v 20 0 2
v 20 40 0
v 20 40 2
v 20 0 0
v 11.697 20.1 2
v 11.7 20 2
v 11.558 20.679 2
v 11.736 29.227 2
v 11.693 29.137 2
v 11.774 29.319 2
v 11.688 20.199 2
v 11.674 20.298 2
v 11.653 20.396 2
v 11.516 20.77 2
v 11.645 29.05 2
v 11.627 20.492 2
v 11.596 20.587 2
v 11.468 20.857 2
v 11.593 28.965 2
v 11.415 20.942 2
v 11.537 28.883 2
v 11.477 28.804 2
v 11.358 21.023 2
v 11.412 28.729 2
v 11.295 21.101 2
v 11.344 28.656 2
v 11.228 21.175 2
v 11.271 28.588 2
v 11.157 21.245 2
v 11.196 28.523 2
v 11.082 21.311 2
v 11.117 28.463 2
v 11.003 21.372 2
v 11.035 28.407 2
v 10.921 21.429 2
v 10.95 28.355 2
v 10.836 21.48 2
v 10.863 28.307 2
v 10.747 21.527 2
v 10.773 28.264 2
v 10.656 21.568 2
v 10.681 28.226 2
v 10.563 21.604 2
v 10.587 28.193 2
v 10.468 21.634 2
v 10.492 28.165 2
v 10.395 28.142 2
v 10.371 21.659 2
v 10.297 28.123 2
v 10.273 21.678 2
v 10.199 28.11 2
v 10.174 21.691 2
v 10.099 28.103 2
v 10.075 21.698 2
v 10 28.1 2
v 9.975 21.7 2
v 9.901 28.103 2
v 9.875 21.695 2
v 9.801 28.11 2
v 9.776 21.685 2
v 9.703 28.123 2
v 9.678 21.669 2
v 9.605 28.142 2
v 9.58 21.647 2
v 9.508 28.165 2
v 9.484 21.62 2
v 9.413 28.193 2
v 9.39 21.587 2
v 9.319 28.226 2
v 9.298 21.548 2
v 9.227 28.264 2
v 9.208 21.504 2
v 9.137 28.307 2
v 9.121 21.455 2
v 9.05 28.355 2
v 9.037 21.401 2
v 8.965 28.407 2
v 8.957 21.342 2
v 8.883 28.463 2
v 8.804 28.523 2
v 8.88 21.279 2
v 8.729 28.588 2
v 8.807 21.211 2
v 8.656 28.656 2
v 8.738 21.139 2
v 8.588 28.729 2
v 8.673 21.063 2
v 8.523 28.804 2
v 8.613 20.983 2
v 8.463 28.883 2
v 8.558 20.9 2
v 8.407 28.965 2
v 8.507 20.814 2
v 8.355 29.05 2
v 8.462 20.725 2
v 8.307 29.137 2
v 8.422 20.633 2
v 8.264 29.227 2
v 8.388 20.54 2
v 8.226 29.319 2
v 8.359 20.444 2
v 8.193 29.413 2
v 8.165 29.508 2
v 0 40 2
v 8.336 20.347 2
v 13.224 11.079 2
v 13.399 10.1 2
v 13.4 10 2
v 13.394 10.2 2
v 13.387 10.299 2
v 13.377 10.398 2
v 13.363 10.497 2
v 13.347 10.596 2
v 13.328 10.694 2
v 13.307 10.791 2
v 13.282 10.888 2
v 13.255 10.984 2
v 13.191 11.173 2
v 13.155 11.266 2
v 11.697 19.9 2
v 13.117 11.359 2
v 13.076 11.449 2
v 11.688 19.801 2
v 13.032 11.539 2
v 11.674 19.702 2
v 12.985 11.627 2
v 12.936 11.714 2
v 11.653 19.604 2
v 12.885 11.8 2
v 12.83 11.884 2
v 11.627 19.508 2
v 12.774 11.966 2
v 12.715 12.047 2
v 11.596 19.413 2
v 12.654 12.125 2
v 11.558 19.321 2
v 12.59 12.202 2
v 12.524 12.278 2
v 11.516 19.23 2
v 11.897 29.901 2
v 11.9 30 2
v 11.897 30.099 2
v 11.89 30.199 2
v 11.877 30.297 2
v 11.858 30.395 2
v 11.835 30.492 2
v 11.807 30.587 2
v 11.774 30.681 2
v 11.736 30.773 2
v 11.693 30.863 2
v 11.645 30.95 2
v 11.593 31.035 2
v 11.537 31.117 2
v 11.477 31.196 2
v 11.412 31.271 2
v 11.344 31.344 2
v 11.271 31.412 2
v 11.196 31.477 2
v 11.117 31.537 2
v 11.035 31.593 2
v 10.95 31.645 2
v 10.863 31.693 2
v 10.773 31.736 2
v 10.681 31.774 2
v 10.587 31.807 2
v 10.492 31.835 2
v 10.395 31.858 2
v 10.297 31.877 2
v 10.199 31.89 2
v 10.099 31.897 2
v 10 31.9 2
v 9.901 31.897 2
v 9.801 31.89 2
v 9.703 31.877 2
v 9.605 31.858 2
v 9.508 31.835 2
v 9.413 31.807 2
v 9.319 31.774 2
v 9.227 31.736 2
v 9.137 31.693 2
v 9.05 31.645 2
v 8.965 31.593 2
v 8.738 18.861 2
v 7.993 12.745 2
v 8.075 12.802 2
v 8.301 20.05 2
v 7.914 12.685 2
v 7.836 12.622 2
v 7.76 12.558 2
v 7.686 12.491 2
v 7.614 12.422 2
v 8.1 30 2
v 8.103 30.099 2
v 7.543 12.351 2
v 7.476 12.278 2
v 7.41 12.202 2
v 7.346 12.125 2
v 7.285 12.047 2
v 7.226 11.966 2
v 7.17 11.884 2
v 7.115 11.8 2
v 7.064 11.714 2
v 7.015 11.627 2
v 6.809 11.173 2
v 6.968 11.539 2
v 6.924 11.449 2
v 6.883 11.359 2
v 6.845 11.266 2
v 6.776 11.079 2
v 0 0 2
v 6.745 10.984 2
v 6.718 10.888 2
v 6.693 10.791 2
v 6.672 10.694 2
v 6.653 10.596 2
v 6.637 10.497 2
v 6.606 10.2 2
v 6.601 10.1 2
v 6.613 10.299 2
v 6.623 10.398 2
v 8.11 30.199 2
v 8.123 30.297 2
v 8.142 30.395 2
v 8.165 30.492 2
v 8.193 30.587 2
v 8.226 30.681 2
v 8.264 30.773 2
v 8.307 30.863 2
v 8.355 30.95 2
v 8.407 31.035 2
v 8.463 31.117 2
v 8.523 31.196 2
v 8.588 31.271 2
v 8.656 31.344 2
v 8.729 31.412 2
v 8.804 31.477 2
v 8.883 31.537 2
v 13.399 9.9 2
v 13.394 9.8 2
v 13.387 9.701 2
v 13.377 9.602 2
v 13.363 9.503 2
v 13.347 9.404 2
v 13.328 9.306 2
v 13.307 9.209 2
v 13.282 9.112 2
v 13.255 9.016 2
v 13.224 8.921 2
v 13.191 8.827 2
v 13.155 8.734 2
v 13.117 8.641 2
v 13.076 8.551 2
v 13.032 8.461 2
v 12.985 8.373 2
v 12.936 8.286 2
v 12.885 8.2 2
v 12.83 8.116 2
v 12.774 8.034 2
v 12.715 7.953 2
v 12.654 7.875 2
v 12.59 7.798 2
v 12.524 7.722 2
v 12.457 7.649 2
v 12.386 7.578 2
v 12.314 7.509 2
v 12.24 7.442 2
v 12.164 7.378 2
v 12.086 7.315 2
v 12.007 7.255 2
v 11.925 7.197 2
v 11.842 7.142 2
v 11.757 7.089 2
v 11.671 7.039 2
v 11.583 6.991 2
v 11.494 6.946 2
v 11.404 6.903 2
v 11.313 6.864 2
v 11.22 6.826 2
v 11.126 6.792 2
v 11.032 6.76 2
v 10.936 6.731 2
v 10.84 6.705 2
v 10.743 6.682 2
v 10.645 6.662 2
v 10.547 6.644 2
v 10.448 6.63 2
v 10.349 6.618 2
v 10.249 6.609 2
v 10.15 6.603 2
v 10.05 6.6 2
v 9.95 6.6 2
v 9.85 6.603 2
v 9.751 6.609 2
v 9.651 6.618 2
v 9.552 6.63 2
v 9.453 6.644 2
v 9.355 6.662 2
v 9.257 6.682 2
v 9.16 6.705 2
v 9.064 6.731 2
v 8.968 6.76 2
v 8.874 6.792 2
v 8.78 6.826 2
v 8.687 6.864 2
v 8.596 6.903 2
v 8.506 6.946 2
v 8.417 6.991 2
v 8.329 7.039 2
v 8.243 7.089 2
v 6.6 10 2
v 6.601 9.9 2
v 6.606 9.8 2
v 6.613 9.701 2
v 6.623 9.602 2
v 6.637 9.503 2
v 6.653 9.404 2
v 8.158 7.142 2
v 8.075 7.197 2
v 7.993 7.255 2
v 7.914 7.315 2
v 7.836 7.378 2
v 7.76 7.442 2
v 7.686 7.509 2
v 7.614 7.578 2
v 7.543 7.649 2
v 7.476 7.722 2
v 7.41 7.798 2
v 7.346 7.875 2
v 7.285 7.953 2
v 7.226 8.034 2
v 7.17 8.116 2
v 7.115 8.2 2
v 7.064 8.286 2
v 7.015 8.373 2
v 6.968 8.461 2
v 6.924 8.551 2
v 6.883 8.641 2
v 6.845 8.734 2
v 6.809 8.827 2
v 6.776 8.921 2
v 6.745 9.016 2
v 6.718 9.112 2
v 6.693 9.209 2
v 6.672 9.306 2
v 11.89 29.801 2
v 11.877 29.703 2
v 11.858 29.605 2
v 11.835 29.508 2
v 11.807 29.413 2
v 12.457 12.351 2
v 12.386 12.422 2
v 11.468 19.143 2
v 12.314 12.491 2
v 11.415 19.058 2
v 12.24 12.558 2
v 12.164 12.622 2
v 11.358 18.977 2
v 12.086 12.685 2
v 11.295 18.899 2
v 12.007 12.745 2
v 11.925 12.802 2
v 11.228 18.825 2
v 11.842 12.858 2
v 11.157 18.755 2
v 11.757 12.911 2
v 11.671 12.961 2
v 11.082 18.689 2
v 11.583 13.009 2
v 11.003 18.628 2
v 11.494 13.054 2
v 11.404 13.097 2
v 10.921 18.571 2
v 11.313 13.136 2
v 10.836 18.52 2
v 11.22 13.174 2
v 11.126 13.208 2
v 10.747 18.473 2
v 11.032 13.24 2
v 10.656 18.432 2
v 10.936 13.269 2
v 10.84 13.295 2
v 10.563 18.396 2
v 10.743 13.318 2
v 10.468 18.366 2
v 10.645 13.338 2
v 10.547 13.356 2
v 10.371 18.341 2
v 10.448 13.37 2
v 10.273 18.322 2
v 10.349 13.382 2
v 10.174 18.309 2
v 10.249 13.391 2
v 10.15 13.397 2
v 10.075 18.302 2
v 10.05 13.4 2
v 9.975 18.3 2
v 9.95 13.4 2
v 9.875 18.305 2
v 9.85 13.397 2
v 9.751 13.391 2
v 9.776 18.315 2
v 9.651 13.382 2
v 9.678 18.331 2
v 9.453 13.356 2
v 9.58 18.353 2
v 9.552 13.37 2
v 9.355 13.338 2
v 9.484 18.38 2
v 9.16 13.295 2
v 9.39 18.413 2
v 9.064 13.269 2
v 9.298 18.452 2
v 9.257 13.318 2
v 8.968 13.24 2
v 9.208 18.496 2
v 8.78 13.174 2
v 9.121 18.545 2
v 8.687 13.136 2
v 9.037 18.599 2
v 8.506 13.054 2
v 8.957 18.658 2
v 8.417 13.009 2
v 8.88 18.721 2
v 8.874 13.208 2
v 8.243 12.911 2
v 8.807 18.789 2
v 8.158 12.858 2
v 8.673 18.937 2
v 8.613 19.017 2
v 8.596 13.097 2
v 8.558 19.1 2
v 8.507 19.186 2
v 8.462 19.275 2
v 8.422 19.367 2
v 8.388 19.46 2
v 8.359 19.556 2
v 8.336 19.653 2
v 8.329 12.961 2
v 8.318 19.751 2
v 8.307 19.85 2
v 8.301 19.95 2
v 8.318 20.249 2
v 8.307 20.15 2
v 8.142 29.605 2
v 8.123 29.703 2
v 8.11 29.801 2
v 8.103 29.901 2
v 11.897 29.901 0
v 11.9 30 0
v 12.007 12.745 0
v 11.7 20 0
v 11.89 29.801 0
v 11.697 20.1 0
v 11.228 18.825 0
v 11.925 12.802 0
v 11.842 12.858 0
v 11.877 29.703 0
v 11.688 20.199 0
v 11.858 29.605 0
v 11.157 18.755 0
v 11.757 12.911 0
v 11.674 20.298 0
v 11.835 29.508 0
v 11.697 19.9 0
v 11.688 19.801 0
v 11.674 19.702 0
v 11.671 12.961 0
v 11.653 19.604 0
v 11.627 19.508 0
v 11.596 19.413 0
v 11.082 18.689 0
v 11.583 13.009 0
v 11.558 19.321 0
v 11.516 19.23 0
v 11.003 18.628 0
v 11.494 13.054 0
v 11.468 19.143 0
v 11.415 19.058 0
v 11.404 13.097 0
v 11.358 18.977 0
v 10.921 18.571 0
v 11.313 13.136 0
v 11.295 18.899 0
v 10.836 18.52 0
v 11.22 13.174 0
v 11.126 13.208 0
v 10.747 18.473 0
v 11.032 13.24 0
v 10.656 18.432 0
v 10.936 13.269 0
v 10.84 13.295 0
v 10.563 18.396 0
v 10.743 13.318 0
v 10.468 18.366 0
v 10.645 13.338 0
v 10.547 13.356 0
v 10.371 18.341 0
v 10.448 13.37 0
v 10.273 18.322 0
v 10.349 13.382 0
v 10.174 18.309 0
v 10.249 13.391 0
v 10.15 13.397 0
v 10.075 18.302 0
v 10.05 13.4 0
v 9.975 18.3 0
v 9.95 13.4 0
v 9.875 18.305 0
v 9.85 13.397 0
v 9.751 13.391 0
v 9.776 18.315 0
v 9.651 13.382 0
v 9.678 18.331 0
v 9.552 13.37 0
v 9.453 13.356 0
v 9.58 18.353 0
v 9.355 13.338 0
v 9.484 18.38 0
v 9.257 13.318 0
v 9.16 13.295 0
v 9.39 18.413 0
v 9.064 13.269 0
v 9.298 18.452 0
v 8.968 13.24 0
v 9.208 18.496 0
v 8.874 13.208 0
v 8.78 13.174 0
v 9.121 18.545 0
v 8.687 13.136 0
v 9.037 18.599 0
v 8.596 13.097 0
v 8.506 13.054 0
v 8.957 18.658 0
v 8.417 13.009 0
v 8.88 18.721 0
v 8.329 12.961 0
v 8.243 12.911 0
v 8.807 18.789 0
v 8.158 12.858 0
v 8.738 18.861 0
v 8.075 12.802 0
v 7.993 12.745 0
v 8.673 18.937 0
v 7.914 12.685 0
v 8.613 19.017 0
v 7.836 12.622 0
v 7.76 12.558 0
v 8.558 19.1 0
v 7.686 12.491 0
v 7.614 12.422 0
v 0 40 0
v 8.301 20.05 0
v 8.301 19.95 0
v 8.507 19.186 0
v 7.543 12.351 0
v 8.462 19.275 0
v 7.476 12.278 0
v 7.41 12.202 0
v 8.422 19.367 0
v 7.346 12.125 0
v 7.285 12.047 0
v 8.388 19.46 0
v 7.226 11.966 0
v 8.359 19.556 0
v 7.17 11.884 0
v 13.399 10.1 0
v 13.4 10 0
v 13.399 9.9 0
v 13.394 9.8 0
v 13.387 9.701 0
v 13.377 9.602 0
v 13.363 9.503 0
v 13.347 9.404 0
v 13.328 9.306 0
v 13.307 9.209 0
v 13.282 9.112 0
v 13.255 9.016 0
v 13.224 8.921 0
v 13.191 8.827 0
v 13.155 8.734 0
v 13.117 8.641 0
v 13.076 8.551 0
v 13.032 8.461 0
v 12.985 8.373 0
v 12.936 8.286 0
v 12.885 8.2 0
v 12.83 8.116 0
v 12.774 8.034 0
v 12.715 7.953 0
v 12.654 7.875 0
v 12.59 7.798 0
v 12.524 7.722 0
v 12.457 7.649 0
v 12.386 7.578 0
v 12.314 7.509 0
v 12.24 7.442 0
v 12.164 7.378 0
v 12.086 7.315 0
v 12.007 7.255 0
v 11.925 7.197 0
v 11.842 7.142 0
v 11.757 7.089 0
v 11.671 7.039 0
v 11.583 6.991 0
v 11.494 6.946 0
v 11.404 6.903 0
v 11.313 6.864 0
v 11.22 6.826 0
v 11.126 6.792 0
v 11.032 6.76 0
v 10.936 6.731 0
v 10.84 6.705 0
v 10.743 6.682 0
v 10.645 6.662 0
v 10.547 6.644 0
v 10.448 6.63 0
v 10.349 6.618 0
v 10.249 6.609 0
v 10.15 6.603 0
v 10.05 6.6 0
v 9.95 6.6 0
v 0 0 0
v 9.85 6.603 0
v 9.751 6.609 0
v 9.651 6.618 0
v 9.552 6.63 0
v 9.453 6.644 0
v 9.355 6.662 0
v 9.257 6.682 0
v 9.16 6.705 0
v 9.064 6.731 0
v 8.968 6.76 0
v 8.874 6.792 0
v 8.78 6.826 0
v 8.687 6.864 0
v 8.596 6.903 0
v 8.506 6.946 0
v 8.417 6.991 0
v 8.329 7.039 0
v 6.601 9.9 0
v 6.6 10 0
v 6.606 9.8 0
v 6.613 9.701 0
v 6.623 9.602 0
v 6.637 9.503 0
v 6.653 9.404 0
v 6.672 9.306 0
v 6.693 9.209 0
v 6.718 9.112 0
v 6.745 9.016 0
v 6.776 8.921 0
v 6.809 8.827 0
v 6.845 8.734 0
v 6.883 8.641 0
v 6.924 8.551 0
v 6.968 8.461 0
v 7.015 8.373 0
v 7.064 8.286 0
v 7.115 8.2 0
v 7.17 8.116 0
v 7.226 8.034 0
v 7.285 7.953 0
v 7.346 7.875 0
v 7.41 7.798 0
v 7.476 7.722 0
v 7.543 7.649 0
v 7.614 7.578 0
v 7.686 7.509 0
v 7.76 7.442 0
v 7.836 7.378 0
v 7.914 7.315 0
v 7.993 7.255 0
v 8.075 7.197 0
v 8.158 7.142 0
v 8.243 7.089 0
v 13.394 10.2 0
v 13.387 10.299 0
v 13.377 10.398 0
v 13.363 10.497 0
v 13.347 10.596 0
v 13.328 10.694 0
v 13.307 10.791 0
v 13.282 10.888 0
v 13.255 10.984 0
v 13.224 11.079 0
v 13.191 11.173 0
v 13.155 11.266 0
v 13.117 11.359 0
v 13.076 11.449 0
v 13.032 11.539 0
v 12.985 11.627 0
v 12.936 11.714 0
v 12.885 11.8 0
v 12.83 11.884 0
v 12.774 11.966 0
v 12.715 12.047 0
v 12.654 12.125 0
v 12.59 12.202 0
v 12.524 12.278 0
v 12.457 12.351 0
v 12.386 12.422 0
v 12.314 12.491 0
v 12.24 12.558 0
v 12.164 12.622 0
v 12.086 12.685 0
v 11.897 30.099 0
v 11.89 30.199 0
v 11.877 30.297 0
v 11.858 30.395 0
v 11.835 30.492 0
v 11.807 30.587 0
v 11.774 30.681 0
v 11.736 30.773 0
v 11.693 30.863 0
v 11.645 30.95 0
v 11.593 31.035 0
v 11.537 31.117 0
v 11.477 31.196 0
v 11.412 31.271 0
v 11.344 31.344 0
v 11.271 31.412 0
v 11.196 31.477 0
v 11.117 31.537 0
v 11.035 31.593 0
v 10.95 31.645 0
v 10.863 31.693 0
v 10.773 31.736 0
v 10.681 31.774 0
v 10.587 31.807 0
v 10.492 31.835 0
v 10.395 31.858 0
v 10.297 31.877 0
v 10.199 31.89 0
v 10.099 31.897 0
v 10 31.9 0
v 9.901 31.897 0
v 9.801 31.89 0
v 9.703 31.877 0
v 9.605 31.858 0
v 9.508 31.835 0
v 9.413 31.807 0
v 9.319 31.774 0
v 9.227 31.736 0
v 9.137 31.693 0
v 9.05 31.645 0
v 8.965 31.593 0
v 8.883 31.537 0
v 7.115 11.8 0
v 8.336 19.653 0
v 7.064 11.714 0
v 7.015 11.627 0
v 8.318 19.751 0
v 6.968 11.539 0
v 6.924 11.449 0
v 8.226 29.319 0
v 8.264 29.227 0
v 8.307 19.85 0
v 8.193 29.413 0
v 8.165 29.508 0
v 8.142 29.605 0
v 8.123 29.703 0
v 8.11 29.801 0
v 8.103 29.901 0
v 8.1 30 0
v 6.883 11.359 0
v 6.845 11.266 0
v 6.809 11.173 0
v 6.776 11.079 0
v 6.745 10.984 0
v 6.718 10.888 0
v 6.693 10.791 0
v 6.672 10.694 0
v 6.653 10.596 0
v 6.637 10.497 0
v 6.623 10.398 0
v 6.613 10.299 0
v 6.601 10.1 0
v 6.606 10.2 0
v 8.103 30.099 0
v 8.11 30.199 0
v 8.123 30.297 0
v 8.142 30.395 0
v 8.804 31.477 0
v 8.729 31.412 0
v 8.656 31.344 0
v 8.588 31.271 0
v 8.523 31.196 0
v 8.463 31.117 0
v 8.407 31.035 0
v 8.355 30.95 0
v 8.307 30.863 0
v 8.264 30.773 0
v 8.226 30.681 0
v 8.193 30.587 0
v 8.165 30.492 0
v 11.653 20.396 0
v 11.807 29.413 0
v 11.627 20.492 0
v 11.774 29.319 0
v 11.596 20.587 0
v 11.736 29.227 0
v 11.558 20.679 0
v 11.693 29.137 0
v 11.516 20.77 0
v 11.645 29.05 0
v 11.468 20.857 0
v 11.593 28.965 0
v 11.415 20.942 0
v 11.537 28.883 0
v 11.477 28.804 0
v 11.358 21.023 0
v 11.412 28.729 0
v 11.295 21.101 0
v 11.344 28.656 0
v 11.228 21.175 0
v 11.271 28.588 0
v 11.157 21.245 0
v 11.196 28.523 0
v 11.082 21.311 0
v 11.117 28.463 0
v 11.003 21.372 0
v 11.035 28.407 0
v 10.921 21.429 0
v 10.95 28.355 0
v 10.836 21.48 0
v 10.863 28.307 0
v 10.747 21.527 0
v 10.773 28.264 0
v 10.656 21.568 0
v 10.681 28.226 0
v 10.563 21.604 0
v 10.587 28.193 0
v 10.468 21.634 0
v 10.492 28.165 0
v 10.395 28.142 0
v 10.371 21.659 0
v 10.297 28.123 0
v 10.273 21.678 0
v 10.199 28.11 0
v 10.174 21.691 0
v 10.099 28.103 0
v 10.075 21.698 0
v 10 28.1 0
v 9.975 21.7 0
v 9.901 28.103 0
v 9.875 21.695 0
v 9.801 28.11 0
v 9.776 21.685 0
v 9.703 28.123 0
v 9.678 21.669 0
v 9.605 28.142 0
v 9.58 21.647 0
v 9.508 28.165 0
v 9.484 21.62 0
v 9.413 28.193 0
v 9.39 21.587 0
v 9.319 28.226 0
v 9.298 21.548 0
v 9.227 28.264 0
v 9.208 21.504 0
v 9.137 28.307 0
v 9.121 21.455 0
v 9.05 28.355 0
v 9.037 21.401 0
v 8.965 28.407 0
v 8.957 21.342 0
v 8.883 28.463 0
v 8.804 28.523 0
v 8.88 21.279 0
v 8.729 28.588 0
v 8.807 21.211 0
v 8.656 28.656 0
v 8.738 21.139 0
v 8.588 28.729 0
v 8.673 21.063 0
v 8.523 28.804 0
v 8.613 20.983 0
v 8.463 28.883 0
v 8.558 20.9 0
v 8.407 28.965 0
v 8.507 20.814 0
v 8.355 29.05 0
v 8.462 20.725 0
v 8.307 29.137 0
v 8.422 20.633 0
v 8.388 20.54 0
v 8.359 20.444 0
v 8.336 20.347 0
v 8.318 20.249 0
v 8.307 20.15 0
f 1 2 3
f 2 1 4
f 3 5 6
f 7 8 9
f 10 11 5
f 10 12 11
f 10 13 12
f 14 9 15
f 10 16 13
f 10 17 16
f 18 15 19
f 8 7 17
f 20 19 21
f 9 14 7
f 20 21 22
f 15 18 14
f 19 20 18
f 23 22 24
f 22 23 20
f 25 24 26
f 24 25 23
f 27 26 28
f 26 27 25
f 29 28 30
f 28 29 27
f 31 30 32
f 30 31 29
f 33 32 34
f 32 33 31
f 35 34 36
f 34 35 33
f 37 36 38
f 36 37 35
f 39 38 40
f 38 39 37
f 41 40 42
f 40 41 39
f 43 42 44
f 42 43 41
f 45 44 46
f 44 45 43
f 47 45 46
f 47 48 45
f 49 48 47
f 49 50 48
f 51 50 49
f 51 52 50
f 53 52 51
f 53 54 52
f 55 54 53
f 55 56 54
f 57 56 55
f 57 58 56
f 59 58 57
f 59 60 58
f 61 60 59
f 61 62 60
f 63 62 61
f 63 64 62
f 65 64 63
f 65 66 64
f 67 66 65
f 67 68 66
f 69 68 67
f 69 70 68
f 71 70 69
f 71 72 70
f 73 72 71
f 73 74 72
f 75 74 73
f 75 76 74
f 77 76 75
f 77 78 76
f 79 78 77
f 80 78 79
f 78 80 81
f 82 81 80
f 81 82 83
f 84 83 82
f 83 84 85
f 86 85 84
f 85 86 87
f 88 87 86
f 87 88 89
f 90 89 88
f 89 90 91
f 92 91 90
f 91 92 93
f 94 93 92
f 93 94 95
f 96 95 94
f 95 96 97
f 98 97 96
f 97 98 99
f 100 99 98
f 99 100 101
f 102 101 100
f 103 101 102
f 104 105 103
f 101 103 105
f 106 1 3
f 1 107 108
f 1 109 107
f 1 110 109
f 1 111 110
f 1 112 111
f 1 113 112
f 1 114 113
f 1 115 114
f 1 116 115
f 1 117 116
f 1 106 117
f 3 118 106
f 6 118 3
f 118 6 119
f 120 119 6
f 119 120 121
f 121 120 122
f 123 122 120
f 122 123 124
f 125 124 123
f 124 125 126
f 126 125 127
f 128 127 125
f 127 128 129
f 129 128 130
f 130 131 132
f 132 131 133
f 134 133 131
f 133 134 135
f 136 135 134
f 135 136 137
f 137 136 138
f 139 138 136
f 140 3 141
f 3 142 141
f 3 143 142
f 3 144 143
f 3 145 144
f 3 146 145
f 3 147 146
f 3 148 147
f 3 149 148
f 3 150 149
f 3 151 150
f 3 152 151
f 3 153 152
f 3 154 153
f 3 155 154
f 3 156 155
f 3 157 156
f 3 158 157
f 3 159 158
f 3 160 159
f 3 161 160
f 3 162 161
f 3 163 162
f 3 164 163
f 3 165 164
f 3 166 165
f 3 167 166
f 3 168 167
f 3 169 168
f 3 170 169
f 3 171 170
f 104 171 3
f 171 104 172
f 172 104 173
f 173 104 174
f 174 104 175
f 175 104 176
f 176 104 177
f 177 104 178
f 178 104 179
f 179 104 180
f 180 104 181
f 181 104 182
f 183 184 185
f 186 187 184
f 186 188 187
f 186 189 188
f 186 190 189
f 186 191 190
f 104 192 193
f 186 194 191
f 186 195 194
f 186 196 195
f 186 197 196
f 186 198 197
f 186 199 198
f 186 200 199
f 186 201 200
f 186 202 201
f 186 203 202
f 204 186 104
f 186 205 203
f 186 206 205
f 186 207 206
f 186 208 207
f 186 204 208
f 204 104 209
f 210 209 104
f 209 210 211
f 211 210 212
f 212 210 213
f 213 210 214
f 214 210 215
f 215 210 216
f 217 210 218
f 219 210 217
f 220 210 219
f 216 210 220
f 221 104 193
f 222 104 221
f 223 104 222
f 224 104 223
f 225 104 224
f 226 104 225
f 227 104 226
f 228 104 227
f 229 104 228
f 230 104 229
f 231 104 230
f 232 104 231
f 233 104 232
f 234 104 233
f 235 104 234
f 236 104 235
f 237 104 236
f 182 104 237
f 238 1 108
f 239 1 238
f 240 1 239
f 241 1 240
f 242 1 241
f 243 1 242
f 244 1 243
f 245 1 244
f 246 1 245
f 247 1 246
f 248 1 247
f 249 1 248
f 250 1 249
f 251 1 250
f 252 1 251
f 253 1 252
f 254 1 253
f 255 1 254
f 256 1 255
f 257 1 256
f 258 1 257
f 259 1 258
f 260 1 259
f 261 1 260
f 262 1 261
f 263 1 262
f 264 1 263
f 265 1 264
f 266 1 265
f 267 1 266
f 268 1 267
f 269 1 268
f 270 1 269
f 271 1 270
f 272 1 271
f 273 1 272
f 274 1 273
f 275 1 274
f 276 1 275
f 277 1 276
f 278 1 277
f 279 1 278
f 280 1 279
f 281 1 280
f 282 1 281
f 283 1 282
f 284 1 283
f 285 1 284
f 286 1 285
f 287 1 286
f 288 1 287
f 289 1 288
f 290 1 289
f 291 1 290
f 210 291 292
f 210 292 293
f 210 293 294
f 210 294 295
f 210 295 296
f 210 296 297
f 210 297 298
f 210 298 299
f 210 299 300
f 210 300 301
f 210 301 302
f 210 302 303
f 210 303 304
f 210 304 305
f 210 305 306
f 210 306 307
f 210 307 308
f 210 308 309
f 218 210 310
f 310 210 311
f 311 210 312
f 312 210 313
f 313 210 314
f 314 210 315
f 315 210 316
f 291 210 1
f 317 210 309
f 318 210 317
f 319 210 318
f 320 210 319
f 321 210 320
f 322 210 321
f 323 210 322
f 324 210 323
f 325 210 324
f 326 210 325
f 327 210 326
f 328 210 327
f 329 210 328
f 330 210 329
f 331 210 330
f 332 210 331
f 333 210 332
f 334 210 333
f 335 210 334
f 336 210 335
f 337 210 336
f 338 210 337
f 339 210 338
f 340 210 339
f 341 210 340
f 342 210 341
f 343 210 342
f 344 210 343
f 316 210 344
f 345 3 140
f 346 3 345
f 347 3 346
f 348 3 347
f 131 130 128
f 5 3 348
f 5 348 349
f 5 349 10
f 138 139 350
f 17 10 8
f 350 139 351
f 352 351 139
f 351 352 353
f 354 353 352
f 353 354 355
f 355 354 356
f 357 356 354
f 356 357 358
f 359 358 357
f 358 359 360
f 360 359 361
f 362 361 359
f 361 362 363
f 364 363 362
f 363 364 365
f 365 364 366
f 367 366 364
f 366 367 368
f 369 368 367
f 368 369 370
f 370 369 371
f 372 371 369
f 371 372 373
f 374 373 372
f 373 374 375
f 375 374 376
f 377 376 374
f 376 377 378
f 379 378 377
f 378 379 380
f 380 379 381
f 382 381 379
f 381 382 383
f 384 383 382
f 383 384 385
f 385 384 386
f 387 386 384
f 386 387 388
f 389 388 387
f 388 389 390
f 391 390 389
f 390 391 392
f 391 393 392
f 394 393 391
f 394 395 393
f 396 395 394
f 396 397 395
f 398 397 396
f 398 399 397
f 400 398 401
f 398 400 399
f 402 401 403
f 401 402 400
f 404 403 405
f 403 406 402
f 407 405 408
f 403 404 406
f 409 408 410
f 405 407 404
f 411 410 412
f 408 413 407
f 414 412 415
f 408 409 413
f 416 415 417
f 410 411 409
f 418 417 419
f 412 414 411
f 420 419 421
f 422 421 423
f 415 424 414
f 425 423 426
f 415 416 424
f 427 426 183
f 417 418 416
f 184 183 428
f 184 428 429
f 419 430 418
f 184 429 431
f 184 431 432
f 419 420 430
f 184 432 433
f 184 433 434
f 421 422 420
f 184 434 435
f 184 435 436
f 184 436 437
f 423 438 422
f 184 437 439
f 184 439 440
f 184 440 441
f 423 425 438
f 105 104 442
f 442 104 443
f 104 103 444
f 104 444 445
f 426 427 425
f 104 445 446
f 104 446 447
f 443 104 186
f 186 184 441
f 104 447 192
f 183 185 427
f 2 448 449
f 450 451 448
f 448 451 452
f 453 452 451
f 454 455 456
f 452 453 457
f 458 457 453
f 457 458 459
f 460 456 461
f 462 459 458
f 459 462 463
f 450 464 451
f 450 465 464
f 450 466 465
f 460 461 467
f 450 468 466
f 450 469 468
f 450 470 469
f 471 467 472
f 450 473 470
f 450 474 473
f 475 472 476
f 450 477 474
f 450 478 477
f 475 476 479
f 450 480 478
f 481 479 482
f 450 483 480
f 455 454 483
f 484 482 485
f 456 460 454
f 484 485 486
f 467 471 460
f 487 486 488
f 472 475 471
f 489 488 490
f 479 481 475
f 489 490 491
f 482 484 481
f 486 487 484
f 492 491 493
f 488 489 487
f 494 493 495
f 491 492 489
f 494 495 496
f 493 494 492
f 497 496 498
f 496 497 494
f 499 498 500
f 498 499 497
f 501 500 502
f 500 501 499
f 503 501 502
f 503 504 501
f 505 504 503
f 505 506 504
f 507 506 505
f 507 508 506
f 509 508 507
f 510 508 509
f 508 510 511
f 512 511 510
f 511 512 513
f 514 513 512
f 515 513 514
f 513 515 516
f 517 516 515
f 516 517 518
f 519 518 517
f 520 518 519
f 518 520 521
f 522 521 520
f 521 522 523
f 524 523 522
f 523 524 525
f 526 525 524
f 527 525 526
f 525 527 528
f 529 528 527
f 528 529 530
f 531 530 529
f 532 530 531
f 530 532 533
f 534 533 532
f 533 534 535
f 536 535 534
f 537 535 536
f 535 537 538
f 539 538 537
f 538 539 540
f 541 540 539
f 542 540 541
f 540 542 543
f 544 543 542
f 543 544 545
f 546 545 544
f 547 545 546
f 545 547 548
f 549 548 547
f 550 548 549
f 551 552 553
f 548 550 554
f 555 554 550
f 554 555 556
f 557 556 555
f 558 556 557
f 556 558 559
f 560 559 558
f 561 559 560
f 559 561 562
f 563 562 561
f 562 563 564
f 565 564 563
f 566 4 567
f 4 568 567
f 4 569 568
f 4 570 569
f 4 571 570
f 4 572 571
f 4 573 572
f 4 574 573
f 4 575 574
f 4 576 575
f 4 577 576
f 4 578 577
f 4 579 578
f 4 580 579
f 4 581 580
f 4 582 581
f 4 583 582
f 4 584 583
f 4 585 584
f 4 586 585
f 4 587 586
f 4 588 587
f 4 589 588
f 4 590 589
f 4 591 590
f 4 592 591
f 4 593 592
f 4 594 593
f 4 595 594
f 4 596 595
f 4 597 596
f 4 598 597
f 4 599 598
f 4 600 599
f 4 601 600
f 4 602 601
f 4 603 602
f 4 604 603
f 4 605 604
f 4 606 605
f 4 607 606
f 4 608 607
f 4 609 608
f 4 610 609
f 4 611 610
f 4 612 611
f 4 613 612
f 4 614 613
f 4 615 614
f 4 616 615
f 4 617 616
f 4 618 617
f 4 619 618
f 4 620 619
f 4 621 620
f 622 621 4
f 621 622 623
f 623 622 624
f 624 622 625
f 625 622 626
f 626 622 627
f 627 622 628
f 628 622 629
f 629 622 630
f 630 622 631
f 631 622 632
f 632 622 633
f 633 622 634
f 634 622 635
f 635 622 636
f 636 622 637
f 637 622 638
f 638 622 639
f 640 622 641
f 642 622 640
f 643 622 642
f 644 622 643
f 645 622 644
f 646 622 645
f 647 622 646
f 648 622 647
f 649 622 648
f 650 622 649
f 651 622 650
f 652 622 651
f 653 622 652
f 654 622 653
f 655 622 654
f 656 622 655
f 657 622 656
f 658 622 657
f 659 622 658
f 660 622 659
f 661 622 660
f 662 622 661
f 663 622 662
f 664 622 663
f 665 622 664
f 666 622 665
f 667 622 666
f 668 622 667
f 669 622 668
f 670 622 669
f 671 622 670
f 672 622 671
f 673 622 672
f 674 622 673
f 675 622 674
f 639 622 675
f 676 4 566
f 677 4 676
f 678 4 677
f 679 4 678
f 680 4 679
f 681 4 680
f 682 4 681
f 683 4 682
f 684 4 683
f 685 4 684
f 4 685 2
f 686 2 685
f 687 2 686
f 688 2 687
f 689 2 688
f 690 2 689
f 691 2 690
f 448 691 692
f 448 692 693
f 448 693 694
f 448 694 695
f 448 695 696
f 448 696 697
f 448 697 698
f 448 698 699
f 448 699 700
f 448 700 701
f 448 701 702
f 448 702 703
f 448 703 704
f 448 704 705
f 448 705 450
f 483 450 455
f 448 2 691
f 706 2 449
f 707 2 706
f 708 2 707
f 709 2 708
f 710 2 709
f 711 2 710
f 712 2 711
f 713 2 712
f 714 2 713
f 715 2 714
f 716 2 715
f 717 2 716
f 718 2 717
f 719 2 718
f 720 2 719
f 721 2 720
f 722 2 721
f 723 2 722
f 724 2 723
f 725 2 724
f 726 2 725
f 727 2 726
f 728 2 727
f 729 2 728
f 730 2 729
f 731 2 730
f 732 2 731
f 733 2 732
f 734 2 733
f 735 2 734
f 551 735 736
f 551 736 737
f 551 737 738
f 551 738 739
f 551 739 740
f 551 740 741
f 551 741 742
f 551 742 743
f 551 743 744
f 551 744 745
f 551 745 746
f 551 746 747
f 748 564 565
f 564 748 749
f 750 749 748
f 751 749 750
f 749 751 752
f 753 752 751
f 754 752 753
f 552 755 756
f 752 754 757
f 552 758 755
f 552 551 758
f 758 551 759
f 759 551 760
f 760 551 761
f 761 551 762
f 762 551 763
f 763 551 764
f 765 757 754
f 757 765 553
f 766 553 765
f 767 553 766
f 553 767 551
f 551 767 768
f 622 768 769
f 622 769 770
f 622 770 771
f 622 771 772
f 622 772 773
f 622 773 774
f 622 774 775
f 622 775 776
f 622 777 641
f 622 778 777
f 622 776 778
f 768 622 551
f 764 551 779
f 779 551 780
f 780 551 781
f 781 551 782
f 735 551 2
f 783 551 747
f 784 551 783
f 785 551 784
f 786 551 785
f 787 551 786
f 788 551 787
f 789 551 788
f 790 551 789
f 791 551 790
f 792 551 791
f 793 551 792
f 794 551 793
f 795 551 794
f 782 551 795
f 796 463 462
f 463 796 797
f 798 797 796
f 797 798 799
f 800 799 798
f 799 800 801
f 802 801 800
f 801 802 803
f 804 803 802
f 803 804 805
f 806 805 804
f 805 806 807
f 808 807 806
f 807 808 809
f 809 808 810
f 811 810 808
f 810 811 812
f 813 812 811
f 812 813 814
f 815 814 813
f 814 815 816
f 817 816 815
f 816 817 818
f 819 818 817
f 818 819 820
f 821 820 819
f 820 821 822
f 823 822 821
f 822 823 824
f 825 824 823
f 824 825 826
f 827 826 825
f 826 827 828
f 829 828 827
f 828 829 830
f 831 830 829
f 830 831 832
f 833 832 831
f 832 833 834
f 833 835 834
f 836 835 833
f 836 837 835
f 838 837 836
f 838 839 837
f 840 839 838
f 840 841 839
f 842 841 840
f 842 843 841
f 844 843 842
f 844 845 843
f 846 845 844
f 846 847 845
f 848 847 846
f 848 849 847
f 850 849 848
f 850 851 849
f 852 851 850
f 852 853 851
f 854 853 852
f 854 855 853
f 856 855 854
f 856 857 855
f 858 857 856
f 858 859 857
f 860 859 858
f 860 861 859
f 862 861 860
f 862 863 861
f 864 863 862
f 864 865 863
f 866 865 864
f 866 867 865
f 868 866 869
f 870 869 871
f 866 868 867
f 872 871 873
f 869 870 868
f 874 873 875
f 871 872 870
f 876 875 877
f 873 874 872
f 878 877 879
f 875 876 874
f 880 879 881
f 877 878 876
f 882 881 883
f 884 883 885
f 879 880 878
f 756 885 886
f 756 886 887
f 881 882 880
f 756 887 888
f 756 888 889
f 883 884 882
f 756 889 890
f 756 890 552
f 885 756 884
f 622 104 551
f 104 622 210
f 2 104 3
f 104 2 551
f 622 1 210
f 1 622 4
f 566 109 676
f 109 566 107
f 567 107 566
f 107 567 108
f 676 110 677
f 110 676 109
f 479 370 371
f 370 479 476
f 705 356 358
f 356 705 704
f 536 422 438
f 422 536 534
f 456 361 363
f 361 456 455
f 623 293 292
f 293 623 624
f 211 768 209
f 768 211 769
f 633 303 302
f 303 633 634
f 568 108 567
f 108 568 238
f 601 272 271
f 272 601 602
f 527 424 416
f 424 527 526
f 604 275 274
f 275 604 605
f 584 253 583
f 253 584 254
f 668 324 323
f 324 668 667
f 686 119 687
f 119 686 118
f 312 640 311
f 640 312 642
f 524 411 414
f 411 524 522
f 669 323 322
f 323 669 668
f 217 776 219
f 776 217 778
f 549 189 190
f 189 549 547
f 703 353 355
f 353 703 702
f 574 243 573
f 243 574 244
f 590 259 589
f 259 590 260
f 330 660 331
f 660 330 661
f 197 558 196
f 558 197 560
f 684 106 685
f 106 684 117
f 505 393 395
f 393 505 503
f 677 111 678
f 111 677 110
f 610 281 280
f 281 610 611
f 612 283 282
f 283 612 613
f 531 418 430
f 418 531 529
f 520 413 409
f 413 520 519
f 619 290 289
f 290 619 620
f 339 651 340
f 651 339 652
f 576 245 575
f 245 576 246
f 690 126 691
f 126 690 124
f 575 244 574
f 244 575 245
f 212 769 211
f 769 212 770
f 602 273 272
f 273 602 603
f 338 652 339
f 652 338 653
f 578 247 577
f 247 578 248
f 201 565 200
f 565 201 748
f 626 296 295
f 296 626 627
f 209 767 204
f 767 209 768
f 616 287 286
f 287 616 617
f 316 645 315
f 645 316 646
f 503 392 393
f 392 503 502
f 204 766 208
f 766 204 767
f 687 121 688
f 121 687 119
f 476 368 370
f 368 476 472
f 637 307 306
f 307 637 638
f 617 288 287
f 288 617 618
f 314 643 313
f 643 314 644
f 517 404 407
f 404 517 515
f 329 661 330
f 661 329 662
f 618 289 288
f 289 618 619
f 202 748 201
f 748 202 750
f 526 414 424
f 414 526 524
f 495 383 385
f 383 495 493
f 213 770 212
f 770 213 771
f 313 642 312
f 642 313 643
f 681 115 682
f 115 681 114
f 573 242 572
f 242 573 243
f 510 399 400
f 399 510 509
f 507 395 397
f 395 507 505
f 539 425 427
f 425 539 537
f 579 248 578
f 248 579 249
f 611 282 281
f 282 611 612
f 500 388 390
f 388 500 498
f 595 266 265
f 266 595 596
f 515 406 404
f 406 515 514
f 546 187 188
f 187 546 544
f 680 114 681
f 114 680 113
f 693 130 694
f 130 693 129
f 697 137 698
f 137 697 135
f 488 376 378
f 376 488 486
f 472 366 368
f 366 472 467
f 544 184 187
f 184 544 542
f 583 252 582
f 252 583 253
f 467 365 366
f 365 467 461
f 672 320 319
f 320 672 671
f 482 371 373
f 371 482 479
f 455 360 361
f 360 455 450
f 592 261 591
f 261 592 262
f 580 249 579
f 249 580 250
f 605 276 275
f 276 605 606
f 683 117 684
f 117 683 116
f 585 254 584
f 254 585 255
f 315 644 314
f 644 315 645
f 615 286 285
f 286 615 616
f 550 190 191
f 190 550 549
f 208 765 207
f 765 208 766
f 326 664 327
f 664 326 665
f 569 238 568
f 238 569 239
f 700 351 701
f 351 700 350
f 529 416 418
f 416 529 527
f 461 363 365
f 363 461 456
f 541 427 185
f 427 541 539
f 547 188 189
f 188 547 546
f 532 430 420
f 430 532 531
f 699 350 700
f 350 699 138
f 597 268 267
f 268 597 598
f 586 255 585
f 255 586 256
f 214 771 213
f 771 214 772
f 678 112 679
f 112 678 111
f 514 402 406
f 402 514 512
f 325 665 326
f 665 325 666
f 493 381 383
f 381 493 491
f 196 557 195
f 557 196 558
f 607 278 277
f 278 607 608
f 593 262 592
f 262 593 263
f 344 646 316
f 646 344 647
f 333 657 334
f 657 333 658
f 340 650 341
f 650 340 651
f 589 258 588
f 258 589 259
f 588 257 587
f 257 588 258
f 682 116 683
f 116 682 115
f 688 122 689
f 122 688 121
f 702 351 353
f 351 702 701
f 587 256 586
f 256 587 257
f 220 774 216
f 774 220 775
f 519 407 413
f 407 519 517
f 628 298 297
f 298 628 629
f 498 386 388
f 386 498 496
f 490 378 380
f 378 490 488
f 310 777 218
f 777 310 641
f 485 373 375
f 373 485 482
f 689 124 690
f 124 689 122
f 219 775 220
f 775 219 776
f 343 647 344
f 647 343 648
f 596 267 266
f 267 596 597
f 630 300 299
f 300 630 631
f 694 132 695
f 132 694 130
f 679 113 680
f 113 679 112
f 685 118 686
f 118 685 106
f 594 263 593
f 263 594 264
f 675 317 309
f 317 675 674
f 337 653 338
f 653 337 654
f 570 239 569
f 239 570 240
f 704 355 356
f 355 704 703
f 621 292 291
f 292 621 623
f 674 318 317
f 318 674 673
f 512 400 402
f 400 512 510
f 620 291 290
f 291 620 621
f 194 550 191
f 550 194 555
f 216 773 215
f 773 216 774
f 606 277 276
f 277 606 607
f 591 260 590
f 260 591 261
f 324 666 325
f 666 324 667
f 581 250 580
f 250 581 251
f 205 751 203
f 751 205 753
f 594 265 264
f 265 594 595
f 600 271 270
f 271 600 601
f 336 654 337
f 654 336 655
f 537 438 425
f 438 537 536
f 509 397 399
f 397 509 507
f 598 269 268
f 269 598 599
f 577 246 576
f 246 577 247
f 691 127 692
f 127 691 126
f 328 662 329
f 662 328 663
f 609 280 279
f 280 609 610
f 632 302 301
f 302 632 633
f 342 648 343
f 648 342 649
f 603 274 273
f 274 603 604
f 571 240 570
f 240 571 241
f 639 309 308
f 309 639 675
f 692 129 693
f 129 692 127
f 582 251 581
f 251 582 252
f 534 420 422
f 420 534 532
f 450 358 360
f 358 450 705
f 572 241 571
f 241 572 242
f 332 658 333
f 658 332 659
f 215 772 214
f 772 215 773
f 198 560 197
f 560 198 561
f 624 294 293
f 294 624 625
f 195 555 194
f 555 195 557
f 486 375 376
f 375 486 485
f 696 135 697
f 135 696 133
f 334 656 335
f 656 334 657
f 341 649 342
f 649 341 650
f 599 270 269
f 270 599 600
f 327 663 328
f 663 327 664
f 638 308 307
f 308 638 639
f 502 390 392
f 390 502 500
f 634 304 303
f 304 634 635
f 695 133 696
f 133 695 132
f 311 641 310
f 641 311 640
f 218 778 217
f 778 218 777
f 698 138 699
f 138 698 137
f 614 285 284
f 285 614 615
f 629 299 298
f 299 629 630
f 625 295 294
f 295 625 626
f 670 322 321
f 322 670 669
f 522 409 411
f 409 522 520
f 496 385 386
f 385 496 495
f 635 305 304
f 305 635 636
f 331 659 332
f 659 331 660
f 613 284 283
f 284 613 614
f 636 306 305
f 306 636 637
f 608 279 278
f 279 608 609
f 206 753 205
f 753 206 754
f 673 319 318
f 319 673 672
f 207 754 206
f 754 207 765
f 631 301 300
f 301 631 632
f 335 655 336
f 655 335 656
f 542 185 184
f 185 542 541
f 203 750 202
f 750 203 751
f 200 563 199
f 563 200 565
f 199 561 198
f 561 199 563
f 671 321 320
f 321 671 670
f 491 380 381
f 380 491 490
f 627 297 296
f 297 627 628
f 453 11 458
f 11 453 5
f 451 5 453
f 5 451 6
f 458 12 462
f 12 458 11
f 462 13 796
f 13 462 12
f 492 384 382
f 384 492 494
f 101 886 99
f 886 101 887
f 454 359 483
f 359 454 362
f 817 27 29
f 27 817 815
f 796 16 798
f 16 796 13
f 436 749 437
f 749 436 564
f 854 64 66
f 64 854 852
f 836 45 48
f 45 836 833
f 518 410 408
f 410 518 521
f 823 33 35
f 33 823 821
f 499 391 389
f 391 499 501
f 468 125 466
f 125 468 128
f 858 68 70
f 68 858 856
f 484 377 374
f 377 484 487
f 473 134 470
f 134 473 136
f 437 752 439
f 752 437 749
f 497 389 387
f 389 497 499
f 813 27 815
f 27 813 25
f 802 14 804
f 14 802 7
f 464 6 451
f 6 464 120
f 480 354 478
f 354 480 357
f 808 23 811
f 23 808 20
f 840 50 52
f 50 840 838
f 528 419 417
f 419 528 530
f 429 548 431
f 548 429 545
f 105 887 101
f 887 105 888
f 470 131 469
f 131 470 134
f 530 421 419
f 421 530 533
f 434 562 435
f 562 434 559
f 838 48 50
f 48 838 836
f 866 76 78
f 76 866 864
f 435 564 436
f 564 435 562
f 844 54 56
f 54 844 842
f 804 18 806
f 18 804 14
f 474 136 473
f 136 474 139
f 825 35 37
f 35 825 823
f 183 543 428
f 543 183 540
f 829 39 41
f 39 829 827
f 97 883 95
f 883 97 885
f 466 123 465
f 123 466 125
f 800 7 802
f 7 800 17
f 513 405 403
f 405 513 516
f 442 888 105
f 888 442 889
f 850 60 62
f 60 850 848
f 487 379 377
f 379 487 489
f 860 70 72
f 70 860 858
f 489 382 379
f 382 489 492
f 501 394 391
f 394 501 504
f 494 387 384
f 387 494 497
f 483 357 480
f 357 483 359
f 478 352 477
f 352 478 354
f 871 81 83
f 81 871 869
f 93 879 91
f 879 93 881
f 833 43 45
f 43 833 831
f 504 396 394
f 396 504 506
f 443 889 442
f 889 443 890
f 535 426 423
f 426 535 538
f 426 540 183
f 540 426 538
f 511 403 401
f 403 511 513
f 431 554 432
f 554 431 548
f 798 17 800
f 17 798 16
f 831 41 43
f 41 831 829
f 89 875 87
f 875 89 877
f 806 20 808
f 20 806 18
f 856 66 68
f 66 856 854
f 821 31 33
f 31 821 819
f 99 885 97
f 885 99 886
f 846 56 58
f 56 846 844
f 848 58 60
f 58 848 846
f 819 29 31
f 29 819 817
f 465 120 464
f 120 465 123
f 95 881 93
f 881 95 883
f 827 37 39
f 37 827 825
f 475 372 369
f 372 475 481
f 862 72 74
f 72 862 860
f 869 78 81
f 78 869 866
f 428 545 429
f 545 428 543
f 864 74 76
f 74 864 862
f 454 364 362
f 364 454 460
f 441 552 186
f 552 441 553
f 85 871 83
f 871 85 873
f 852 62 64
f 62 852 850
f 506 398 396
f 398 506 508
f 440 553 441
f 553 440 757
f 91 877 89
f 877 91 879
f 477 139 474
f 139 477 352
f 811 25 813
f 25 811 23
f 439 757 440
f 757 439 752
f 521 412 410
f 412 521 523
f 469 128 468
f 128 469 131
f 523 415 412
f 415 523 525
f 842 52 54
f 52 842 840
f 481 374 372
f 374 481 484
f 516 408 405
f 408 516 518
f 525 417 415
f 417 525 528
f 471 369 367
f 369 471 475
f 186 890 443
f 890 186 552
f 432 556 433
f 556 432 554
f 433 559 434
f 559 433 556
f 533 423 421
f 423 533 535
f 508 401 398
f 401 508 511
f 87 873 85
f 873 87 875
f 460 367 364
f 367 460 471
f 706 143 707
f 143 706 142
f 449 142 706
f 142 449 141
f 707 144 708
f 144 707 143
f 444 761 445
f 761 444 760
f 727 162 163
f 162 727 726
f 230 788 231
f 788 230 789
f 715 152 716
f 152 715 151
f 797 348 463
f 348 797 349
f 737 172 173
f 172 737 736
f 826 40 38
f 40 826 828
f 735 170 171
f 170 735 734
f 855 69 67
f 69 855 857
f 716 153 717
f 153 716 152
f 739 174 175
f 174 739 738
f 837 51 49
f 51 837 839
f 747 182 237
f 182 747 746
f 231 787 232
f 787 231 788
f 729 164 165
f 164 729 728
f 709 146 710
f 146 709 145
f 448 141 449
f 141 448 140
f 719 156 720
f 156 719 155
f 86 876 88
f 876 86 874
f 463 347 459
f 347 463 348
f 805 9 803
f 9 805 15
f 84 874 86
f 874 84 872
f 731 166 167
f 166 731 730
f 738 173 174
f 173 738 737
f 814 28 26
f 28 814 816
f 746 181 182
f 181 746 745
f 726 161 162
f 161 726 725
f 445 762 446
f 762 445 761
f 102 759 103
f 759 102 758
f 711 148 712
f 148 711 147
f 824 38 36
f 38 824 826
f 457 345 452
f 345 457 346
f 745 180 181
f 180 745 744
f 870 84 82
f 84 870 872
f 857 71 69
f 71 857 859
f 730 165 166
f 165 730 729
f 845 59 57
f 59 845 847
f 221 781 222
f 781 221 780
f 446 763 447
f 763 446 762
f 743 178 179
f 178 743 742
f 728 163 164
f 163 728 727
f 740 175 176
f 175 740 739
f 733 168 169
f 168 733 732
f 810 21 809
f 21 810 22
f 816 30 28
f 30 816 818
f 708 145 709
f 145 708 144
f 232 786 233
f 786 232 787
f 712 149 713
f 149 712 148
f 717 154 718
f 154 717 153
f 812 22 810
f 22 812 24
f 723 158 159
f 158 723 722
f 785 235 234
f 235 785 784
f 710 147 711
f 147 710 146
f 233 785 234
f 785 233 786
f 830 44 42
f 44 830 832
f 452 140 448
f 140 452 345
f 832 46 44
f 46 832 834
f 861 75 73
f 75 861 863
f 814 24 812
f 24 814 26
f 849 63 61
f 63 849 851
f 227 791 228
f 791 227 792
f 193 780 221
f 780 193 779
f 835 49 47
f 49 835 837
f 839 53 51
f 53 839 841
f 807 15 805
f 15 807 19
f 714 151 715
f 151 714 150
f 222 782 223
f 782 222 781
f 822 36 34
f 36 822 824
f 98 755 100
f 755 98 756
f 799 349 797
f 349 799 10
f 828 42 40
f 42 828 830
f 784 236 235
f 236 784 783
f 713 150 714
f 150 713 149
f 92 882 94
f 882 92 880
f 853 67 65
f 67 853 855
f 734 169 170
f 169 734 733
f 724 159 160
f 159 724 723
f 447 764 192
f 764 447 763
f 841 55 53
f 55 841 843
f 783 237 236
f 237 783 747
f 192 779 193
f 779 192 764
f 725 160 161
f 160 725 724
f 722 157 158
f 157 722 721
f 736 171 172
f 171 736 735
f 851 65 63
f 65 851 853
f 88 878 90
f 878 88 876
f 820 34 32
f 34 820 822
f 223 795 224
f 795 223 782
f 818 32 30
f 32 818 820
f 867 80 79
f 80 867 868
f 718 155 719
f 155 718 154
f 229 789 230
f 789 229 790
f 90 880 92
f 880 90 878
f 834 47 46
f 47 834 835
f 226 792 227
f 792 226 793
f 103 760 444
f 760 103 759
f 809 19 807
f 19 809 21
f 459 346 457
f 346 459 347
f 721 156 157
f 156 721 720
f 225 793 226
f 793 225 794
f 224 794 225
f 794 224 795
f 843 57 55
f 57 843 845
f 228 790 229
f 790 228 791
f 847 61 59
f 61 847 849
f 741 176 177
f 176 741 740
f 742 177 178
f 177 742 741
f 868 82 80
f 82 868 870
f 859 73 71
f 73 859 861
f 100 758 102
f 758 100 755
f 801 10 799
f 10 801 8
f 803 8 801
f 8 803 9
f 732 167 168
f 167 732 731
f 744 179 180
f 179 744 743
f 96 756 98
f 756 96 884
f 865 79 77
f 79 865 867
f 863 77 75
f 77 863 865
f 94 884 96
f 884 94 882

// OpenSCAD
// file: 6-32x5_8_screw.scad
// 6-32x5_8_screw.scad

// dimensional constants
screw_head_radius = 2.85;
screw_head_height = 3.51;
screw_radius = 1.9;
screw_length = 15.7;

module screw() {
	rotate(a=90, v=[1,0,0]){
		translate(v=[-screw_head_radius,0,-screw_head_radius]) {
			color("salmon") import("../parts/screws/ROB-12332.STL",convexity=3);	
		}
	}
}

module screw_cavity(fs=.5) {
	$fs = fs;
	union() {
		shim =.1;
		translate(v=[0,0,screw_head_height]) {
			cylinder(h=screw_length+.2, r=screw_radius);
		}
		translate(v=[0,0,-shim]) {
			cylinder(h=screw_head_height+shim,r=screw_head_radius + .2 );
		}
	}
}


//screw();
//screw_cavity();
// file: 1_4_hub.scad
// 1_4_hub.scad

include <6-32x5_8_screw.scad>;

// dimensional constants
hub_height = 9.553;
hub_body_radius = 10.25;
hub_screw_mount_radius = 3.43;
screw_offset = 6.910;
hub_mount_thickness = 5.0;
hub_mount_radius = 15;
axle_radius = 3.4;


module hub() {
	rotate(a=-90,v=[1,0,0]) {
		translate(v=[0,-hub_height,0]) {
			color("cornflowerBlue") import("../parts/hubs/1_4_metal_hub.stl",convexity=3);
		}
	}
}

module hub_cavity_profile() {
	color("Orange") scale(v=[1.05,1.05]) union() {
		projection(cut=false) hub();
		square(size = [2*hub_body_radius-2,2*hub_body_radius-2], center=true);
	}
}

module hub_cavity(height=hub_height + .2,fs=.5) {
	$fs=fs;
	union() {
		linear_extrude(height=height, center = false, convexity = 10, twist=0) hub_cavity_profile();
		translate(v=[0,0,3.52]) rotate(a=90, v=[-1,0,0]) cylinder(h=20,r=2);
	}
}

module hub_screws() {
	for (dirX=[1, -1]) {
		for (dirY=[1,-1]) {
			translate(v=[screw_offset * dirX,screw_offset * dirY,0]) {
				screw();
			}
		}
	}
}

module hub_screw_cavities(fs=.05) {
	for (dirX=[1, -1]) {
		for (dirY=[1,-1]) {
			translate(v=[screw_offset*dirX,screw_offset*dirY,0]) {
				screw_cavity(fs=fs);
			}
		}
	}
}

module hub_assembly (v_offset=0,thickness=hub_mount_thickness) {
	hub_mount_thickness=thickness;
	translate(v=[0,0,hub_mount_thickness+v_offset]) {
		hub();
	}
	translate(v=[0,0,-screw_head_height+v_offset]) {
		hub_screws();
	}
}

module hub_mount_surface(thickness=hub_mount_thickness,fs=.5) {
	hub_mount_thickness = thickness;
	$fs=fs;
	difference() {
		cylinder(h=hub_mount_thickness, r=hub_mount_radius);
		translate(v=[0,0,-screw_head_height - .1]) hub_screw_cavities(fs=fs);
		translate(v=[0,0,-.1])  cylinder(h=hub_mount_thickness+.2,r=axle_radius);
	}
}

module hub_mount_inset_screw(thickness=hub_mount_thickness,fs=.5) {
	hub_mount_thickness = thickness;
	$fs=fs;
	difference() {
		cylinder(h=hub_mount_thickness+screw_head_height, r=hub_mount_radius);
		hub_screw_cavities(fs=fs);
		translate(v=[0,0,-.1])
			cylinder(h=hub_mount_thickness+screw_head_height+.2, r=axle_radius);
	}
}


module hub_mount_enclosed(thickness=hub_mount_thickness,fs=.5) {
	hub_mount_thickness = thickness;
	$fs=fs;
	difference() {
		cylinder(h=hub_mount_thickness+screw_head_height+hub_height-.1, r=hub_mount_radius);
		translate(v=[0,0,hub_mount_thickness+screw_head_height]) hub_cavity(fs=fs);
		hub_screw_cavities(fs=fs);
		translate(v=[0,0,-.1])
			cylinder(h=hub_mount_thickness+screw_head_height+.2, r=axle_radius);
	}
}

//hub();
//hub_screws();
//hub_cavity();
//hub_screw_cavities();
//translate([0,0,-screw_head_height]) hub_screw_cavities();

//hub_assembly();
//hub_mount_surface();

//translate(v=[0,0,screw_head_height]) hub_assembly();
//hub_mount_inset_screw();
//hub_mount_enclosed();
// main file
// tumblerHoleTest.scad

include <1_4_hub.scad>;

$fs = .1;
$fa = 1;

rivet_diam = 3.4;

color("Blue") difference() {
	cube([20,40,2]);
	translate([10,10,-1]) cylinder(h=4, r=axle_radius);
	translate([10,20,-1]) cylinder(h=4, d=rivet_diam);
	translate([10,30,-1]) cylinder(h=4, r=screw_radius);
}
